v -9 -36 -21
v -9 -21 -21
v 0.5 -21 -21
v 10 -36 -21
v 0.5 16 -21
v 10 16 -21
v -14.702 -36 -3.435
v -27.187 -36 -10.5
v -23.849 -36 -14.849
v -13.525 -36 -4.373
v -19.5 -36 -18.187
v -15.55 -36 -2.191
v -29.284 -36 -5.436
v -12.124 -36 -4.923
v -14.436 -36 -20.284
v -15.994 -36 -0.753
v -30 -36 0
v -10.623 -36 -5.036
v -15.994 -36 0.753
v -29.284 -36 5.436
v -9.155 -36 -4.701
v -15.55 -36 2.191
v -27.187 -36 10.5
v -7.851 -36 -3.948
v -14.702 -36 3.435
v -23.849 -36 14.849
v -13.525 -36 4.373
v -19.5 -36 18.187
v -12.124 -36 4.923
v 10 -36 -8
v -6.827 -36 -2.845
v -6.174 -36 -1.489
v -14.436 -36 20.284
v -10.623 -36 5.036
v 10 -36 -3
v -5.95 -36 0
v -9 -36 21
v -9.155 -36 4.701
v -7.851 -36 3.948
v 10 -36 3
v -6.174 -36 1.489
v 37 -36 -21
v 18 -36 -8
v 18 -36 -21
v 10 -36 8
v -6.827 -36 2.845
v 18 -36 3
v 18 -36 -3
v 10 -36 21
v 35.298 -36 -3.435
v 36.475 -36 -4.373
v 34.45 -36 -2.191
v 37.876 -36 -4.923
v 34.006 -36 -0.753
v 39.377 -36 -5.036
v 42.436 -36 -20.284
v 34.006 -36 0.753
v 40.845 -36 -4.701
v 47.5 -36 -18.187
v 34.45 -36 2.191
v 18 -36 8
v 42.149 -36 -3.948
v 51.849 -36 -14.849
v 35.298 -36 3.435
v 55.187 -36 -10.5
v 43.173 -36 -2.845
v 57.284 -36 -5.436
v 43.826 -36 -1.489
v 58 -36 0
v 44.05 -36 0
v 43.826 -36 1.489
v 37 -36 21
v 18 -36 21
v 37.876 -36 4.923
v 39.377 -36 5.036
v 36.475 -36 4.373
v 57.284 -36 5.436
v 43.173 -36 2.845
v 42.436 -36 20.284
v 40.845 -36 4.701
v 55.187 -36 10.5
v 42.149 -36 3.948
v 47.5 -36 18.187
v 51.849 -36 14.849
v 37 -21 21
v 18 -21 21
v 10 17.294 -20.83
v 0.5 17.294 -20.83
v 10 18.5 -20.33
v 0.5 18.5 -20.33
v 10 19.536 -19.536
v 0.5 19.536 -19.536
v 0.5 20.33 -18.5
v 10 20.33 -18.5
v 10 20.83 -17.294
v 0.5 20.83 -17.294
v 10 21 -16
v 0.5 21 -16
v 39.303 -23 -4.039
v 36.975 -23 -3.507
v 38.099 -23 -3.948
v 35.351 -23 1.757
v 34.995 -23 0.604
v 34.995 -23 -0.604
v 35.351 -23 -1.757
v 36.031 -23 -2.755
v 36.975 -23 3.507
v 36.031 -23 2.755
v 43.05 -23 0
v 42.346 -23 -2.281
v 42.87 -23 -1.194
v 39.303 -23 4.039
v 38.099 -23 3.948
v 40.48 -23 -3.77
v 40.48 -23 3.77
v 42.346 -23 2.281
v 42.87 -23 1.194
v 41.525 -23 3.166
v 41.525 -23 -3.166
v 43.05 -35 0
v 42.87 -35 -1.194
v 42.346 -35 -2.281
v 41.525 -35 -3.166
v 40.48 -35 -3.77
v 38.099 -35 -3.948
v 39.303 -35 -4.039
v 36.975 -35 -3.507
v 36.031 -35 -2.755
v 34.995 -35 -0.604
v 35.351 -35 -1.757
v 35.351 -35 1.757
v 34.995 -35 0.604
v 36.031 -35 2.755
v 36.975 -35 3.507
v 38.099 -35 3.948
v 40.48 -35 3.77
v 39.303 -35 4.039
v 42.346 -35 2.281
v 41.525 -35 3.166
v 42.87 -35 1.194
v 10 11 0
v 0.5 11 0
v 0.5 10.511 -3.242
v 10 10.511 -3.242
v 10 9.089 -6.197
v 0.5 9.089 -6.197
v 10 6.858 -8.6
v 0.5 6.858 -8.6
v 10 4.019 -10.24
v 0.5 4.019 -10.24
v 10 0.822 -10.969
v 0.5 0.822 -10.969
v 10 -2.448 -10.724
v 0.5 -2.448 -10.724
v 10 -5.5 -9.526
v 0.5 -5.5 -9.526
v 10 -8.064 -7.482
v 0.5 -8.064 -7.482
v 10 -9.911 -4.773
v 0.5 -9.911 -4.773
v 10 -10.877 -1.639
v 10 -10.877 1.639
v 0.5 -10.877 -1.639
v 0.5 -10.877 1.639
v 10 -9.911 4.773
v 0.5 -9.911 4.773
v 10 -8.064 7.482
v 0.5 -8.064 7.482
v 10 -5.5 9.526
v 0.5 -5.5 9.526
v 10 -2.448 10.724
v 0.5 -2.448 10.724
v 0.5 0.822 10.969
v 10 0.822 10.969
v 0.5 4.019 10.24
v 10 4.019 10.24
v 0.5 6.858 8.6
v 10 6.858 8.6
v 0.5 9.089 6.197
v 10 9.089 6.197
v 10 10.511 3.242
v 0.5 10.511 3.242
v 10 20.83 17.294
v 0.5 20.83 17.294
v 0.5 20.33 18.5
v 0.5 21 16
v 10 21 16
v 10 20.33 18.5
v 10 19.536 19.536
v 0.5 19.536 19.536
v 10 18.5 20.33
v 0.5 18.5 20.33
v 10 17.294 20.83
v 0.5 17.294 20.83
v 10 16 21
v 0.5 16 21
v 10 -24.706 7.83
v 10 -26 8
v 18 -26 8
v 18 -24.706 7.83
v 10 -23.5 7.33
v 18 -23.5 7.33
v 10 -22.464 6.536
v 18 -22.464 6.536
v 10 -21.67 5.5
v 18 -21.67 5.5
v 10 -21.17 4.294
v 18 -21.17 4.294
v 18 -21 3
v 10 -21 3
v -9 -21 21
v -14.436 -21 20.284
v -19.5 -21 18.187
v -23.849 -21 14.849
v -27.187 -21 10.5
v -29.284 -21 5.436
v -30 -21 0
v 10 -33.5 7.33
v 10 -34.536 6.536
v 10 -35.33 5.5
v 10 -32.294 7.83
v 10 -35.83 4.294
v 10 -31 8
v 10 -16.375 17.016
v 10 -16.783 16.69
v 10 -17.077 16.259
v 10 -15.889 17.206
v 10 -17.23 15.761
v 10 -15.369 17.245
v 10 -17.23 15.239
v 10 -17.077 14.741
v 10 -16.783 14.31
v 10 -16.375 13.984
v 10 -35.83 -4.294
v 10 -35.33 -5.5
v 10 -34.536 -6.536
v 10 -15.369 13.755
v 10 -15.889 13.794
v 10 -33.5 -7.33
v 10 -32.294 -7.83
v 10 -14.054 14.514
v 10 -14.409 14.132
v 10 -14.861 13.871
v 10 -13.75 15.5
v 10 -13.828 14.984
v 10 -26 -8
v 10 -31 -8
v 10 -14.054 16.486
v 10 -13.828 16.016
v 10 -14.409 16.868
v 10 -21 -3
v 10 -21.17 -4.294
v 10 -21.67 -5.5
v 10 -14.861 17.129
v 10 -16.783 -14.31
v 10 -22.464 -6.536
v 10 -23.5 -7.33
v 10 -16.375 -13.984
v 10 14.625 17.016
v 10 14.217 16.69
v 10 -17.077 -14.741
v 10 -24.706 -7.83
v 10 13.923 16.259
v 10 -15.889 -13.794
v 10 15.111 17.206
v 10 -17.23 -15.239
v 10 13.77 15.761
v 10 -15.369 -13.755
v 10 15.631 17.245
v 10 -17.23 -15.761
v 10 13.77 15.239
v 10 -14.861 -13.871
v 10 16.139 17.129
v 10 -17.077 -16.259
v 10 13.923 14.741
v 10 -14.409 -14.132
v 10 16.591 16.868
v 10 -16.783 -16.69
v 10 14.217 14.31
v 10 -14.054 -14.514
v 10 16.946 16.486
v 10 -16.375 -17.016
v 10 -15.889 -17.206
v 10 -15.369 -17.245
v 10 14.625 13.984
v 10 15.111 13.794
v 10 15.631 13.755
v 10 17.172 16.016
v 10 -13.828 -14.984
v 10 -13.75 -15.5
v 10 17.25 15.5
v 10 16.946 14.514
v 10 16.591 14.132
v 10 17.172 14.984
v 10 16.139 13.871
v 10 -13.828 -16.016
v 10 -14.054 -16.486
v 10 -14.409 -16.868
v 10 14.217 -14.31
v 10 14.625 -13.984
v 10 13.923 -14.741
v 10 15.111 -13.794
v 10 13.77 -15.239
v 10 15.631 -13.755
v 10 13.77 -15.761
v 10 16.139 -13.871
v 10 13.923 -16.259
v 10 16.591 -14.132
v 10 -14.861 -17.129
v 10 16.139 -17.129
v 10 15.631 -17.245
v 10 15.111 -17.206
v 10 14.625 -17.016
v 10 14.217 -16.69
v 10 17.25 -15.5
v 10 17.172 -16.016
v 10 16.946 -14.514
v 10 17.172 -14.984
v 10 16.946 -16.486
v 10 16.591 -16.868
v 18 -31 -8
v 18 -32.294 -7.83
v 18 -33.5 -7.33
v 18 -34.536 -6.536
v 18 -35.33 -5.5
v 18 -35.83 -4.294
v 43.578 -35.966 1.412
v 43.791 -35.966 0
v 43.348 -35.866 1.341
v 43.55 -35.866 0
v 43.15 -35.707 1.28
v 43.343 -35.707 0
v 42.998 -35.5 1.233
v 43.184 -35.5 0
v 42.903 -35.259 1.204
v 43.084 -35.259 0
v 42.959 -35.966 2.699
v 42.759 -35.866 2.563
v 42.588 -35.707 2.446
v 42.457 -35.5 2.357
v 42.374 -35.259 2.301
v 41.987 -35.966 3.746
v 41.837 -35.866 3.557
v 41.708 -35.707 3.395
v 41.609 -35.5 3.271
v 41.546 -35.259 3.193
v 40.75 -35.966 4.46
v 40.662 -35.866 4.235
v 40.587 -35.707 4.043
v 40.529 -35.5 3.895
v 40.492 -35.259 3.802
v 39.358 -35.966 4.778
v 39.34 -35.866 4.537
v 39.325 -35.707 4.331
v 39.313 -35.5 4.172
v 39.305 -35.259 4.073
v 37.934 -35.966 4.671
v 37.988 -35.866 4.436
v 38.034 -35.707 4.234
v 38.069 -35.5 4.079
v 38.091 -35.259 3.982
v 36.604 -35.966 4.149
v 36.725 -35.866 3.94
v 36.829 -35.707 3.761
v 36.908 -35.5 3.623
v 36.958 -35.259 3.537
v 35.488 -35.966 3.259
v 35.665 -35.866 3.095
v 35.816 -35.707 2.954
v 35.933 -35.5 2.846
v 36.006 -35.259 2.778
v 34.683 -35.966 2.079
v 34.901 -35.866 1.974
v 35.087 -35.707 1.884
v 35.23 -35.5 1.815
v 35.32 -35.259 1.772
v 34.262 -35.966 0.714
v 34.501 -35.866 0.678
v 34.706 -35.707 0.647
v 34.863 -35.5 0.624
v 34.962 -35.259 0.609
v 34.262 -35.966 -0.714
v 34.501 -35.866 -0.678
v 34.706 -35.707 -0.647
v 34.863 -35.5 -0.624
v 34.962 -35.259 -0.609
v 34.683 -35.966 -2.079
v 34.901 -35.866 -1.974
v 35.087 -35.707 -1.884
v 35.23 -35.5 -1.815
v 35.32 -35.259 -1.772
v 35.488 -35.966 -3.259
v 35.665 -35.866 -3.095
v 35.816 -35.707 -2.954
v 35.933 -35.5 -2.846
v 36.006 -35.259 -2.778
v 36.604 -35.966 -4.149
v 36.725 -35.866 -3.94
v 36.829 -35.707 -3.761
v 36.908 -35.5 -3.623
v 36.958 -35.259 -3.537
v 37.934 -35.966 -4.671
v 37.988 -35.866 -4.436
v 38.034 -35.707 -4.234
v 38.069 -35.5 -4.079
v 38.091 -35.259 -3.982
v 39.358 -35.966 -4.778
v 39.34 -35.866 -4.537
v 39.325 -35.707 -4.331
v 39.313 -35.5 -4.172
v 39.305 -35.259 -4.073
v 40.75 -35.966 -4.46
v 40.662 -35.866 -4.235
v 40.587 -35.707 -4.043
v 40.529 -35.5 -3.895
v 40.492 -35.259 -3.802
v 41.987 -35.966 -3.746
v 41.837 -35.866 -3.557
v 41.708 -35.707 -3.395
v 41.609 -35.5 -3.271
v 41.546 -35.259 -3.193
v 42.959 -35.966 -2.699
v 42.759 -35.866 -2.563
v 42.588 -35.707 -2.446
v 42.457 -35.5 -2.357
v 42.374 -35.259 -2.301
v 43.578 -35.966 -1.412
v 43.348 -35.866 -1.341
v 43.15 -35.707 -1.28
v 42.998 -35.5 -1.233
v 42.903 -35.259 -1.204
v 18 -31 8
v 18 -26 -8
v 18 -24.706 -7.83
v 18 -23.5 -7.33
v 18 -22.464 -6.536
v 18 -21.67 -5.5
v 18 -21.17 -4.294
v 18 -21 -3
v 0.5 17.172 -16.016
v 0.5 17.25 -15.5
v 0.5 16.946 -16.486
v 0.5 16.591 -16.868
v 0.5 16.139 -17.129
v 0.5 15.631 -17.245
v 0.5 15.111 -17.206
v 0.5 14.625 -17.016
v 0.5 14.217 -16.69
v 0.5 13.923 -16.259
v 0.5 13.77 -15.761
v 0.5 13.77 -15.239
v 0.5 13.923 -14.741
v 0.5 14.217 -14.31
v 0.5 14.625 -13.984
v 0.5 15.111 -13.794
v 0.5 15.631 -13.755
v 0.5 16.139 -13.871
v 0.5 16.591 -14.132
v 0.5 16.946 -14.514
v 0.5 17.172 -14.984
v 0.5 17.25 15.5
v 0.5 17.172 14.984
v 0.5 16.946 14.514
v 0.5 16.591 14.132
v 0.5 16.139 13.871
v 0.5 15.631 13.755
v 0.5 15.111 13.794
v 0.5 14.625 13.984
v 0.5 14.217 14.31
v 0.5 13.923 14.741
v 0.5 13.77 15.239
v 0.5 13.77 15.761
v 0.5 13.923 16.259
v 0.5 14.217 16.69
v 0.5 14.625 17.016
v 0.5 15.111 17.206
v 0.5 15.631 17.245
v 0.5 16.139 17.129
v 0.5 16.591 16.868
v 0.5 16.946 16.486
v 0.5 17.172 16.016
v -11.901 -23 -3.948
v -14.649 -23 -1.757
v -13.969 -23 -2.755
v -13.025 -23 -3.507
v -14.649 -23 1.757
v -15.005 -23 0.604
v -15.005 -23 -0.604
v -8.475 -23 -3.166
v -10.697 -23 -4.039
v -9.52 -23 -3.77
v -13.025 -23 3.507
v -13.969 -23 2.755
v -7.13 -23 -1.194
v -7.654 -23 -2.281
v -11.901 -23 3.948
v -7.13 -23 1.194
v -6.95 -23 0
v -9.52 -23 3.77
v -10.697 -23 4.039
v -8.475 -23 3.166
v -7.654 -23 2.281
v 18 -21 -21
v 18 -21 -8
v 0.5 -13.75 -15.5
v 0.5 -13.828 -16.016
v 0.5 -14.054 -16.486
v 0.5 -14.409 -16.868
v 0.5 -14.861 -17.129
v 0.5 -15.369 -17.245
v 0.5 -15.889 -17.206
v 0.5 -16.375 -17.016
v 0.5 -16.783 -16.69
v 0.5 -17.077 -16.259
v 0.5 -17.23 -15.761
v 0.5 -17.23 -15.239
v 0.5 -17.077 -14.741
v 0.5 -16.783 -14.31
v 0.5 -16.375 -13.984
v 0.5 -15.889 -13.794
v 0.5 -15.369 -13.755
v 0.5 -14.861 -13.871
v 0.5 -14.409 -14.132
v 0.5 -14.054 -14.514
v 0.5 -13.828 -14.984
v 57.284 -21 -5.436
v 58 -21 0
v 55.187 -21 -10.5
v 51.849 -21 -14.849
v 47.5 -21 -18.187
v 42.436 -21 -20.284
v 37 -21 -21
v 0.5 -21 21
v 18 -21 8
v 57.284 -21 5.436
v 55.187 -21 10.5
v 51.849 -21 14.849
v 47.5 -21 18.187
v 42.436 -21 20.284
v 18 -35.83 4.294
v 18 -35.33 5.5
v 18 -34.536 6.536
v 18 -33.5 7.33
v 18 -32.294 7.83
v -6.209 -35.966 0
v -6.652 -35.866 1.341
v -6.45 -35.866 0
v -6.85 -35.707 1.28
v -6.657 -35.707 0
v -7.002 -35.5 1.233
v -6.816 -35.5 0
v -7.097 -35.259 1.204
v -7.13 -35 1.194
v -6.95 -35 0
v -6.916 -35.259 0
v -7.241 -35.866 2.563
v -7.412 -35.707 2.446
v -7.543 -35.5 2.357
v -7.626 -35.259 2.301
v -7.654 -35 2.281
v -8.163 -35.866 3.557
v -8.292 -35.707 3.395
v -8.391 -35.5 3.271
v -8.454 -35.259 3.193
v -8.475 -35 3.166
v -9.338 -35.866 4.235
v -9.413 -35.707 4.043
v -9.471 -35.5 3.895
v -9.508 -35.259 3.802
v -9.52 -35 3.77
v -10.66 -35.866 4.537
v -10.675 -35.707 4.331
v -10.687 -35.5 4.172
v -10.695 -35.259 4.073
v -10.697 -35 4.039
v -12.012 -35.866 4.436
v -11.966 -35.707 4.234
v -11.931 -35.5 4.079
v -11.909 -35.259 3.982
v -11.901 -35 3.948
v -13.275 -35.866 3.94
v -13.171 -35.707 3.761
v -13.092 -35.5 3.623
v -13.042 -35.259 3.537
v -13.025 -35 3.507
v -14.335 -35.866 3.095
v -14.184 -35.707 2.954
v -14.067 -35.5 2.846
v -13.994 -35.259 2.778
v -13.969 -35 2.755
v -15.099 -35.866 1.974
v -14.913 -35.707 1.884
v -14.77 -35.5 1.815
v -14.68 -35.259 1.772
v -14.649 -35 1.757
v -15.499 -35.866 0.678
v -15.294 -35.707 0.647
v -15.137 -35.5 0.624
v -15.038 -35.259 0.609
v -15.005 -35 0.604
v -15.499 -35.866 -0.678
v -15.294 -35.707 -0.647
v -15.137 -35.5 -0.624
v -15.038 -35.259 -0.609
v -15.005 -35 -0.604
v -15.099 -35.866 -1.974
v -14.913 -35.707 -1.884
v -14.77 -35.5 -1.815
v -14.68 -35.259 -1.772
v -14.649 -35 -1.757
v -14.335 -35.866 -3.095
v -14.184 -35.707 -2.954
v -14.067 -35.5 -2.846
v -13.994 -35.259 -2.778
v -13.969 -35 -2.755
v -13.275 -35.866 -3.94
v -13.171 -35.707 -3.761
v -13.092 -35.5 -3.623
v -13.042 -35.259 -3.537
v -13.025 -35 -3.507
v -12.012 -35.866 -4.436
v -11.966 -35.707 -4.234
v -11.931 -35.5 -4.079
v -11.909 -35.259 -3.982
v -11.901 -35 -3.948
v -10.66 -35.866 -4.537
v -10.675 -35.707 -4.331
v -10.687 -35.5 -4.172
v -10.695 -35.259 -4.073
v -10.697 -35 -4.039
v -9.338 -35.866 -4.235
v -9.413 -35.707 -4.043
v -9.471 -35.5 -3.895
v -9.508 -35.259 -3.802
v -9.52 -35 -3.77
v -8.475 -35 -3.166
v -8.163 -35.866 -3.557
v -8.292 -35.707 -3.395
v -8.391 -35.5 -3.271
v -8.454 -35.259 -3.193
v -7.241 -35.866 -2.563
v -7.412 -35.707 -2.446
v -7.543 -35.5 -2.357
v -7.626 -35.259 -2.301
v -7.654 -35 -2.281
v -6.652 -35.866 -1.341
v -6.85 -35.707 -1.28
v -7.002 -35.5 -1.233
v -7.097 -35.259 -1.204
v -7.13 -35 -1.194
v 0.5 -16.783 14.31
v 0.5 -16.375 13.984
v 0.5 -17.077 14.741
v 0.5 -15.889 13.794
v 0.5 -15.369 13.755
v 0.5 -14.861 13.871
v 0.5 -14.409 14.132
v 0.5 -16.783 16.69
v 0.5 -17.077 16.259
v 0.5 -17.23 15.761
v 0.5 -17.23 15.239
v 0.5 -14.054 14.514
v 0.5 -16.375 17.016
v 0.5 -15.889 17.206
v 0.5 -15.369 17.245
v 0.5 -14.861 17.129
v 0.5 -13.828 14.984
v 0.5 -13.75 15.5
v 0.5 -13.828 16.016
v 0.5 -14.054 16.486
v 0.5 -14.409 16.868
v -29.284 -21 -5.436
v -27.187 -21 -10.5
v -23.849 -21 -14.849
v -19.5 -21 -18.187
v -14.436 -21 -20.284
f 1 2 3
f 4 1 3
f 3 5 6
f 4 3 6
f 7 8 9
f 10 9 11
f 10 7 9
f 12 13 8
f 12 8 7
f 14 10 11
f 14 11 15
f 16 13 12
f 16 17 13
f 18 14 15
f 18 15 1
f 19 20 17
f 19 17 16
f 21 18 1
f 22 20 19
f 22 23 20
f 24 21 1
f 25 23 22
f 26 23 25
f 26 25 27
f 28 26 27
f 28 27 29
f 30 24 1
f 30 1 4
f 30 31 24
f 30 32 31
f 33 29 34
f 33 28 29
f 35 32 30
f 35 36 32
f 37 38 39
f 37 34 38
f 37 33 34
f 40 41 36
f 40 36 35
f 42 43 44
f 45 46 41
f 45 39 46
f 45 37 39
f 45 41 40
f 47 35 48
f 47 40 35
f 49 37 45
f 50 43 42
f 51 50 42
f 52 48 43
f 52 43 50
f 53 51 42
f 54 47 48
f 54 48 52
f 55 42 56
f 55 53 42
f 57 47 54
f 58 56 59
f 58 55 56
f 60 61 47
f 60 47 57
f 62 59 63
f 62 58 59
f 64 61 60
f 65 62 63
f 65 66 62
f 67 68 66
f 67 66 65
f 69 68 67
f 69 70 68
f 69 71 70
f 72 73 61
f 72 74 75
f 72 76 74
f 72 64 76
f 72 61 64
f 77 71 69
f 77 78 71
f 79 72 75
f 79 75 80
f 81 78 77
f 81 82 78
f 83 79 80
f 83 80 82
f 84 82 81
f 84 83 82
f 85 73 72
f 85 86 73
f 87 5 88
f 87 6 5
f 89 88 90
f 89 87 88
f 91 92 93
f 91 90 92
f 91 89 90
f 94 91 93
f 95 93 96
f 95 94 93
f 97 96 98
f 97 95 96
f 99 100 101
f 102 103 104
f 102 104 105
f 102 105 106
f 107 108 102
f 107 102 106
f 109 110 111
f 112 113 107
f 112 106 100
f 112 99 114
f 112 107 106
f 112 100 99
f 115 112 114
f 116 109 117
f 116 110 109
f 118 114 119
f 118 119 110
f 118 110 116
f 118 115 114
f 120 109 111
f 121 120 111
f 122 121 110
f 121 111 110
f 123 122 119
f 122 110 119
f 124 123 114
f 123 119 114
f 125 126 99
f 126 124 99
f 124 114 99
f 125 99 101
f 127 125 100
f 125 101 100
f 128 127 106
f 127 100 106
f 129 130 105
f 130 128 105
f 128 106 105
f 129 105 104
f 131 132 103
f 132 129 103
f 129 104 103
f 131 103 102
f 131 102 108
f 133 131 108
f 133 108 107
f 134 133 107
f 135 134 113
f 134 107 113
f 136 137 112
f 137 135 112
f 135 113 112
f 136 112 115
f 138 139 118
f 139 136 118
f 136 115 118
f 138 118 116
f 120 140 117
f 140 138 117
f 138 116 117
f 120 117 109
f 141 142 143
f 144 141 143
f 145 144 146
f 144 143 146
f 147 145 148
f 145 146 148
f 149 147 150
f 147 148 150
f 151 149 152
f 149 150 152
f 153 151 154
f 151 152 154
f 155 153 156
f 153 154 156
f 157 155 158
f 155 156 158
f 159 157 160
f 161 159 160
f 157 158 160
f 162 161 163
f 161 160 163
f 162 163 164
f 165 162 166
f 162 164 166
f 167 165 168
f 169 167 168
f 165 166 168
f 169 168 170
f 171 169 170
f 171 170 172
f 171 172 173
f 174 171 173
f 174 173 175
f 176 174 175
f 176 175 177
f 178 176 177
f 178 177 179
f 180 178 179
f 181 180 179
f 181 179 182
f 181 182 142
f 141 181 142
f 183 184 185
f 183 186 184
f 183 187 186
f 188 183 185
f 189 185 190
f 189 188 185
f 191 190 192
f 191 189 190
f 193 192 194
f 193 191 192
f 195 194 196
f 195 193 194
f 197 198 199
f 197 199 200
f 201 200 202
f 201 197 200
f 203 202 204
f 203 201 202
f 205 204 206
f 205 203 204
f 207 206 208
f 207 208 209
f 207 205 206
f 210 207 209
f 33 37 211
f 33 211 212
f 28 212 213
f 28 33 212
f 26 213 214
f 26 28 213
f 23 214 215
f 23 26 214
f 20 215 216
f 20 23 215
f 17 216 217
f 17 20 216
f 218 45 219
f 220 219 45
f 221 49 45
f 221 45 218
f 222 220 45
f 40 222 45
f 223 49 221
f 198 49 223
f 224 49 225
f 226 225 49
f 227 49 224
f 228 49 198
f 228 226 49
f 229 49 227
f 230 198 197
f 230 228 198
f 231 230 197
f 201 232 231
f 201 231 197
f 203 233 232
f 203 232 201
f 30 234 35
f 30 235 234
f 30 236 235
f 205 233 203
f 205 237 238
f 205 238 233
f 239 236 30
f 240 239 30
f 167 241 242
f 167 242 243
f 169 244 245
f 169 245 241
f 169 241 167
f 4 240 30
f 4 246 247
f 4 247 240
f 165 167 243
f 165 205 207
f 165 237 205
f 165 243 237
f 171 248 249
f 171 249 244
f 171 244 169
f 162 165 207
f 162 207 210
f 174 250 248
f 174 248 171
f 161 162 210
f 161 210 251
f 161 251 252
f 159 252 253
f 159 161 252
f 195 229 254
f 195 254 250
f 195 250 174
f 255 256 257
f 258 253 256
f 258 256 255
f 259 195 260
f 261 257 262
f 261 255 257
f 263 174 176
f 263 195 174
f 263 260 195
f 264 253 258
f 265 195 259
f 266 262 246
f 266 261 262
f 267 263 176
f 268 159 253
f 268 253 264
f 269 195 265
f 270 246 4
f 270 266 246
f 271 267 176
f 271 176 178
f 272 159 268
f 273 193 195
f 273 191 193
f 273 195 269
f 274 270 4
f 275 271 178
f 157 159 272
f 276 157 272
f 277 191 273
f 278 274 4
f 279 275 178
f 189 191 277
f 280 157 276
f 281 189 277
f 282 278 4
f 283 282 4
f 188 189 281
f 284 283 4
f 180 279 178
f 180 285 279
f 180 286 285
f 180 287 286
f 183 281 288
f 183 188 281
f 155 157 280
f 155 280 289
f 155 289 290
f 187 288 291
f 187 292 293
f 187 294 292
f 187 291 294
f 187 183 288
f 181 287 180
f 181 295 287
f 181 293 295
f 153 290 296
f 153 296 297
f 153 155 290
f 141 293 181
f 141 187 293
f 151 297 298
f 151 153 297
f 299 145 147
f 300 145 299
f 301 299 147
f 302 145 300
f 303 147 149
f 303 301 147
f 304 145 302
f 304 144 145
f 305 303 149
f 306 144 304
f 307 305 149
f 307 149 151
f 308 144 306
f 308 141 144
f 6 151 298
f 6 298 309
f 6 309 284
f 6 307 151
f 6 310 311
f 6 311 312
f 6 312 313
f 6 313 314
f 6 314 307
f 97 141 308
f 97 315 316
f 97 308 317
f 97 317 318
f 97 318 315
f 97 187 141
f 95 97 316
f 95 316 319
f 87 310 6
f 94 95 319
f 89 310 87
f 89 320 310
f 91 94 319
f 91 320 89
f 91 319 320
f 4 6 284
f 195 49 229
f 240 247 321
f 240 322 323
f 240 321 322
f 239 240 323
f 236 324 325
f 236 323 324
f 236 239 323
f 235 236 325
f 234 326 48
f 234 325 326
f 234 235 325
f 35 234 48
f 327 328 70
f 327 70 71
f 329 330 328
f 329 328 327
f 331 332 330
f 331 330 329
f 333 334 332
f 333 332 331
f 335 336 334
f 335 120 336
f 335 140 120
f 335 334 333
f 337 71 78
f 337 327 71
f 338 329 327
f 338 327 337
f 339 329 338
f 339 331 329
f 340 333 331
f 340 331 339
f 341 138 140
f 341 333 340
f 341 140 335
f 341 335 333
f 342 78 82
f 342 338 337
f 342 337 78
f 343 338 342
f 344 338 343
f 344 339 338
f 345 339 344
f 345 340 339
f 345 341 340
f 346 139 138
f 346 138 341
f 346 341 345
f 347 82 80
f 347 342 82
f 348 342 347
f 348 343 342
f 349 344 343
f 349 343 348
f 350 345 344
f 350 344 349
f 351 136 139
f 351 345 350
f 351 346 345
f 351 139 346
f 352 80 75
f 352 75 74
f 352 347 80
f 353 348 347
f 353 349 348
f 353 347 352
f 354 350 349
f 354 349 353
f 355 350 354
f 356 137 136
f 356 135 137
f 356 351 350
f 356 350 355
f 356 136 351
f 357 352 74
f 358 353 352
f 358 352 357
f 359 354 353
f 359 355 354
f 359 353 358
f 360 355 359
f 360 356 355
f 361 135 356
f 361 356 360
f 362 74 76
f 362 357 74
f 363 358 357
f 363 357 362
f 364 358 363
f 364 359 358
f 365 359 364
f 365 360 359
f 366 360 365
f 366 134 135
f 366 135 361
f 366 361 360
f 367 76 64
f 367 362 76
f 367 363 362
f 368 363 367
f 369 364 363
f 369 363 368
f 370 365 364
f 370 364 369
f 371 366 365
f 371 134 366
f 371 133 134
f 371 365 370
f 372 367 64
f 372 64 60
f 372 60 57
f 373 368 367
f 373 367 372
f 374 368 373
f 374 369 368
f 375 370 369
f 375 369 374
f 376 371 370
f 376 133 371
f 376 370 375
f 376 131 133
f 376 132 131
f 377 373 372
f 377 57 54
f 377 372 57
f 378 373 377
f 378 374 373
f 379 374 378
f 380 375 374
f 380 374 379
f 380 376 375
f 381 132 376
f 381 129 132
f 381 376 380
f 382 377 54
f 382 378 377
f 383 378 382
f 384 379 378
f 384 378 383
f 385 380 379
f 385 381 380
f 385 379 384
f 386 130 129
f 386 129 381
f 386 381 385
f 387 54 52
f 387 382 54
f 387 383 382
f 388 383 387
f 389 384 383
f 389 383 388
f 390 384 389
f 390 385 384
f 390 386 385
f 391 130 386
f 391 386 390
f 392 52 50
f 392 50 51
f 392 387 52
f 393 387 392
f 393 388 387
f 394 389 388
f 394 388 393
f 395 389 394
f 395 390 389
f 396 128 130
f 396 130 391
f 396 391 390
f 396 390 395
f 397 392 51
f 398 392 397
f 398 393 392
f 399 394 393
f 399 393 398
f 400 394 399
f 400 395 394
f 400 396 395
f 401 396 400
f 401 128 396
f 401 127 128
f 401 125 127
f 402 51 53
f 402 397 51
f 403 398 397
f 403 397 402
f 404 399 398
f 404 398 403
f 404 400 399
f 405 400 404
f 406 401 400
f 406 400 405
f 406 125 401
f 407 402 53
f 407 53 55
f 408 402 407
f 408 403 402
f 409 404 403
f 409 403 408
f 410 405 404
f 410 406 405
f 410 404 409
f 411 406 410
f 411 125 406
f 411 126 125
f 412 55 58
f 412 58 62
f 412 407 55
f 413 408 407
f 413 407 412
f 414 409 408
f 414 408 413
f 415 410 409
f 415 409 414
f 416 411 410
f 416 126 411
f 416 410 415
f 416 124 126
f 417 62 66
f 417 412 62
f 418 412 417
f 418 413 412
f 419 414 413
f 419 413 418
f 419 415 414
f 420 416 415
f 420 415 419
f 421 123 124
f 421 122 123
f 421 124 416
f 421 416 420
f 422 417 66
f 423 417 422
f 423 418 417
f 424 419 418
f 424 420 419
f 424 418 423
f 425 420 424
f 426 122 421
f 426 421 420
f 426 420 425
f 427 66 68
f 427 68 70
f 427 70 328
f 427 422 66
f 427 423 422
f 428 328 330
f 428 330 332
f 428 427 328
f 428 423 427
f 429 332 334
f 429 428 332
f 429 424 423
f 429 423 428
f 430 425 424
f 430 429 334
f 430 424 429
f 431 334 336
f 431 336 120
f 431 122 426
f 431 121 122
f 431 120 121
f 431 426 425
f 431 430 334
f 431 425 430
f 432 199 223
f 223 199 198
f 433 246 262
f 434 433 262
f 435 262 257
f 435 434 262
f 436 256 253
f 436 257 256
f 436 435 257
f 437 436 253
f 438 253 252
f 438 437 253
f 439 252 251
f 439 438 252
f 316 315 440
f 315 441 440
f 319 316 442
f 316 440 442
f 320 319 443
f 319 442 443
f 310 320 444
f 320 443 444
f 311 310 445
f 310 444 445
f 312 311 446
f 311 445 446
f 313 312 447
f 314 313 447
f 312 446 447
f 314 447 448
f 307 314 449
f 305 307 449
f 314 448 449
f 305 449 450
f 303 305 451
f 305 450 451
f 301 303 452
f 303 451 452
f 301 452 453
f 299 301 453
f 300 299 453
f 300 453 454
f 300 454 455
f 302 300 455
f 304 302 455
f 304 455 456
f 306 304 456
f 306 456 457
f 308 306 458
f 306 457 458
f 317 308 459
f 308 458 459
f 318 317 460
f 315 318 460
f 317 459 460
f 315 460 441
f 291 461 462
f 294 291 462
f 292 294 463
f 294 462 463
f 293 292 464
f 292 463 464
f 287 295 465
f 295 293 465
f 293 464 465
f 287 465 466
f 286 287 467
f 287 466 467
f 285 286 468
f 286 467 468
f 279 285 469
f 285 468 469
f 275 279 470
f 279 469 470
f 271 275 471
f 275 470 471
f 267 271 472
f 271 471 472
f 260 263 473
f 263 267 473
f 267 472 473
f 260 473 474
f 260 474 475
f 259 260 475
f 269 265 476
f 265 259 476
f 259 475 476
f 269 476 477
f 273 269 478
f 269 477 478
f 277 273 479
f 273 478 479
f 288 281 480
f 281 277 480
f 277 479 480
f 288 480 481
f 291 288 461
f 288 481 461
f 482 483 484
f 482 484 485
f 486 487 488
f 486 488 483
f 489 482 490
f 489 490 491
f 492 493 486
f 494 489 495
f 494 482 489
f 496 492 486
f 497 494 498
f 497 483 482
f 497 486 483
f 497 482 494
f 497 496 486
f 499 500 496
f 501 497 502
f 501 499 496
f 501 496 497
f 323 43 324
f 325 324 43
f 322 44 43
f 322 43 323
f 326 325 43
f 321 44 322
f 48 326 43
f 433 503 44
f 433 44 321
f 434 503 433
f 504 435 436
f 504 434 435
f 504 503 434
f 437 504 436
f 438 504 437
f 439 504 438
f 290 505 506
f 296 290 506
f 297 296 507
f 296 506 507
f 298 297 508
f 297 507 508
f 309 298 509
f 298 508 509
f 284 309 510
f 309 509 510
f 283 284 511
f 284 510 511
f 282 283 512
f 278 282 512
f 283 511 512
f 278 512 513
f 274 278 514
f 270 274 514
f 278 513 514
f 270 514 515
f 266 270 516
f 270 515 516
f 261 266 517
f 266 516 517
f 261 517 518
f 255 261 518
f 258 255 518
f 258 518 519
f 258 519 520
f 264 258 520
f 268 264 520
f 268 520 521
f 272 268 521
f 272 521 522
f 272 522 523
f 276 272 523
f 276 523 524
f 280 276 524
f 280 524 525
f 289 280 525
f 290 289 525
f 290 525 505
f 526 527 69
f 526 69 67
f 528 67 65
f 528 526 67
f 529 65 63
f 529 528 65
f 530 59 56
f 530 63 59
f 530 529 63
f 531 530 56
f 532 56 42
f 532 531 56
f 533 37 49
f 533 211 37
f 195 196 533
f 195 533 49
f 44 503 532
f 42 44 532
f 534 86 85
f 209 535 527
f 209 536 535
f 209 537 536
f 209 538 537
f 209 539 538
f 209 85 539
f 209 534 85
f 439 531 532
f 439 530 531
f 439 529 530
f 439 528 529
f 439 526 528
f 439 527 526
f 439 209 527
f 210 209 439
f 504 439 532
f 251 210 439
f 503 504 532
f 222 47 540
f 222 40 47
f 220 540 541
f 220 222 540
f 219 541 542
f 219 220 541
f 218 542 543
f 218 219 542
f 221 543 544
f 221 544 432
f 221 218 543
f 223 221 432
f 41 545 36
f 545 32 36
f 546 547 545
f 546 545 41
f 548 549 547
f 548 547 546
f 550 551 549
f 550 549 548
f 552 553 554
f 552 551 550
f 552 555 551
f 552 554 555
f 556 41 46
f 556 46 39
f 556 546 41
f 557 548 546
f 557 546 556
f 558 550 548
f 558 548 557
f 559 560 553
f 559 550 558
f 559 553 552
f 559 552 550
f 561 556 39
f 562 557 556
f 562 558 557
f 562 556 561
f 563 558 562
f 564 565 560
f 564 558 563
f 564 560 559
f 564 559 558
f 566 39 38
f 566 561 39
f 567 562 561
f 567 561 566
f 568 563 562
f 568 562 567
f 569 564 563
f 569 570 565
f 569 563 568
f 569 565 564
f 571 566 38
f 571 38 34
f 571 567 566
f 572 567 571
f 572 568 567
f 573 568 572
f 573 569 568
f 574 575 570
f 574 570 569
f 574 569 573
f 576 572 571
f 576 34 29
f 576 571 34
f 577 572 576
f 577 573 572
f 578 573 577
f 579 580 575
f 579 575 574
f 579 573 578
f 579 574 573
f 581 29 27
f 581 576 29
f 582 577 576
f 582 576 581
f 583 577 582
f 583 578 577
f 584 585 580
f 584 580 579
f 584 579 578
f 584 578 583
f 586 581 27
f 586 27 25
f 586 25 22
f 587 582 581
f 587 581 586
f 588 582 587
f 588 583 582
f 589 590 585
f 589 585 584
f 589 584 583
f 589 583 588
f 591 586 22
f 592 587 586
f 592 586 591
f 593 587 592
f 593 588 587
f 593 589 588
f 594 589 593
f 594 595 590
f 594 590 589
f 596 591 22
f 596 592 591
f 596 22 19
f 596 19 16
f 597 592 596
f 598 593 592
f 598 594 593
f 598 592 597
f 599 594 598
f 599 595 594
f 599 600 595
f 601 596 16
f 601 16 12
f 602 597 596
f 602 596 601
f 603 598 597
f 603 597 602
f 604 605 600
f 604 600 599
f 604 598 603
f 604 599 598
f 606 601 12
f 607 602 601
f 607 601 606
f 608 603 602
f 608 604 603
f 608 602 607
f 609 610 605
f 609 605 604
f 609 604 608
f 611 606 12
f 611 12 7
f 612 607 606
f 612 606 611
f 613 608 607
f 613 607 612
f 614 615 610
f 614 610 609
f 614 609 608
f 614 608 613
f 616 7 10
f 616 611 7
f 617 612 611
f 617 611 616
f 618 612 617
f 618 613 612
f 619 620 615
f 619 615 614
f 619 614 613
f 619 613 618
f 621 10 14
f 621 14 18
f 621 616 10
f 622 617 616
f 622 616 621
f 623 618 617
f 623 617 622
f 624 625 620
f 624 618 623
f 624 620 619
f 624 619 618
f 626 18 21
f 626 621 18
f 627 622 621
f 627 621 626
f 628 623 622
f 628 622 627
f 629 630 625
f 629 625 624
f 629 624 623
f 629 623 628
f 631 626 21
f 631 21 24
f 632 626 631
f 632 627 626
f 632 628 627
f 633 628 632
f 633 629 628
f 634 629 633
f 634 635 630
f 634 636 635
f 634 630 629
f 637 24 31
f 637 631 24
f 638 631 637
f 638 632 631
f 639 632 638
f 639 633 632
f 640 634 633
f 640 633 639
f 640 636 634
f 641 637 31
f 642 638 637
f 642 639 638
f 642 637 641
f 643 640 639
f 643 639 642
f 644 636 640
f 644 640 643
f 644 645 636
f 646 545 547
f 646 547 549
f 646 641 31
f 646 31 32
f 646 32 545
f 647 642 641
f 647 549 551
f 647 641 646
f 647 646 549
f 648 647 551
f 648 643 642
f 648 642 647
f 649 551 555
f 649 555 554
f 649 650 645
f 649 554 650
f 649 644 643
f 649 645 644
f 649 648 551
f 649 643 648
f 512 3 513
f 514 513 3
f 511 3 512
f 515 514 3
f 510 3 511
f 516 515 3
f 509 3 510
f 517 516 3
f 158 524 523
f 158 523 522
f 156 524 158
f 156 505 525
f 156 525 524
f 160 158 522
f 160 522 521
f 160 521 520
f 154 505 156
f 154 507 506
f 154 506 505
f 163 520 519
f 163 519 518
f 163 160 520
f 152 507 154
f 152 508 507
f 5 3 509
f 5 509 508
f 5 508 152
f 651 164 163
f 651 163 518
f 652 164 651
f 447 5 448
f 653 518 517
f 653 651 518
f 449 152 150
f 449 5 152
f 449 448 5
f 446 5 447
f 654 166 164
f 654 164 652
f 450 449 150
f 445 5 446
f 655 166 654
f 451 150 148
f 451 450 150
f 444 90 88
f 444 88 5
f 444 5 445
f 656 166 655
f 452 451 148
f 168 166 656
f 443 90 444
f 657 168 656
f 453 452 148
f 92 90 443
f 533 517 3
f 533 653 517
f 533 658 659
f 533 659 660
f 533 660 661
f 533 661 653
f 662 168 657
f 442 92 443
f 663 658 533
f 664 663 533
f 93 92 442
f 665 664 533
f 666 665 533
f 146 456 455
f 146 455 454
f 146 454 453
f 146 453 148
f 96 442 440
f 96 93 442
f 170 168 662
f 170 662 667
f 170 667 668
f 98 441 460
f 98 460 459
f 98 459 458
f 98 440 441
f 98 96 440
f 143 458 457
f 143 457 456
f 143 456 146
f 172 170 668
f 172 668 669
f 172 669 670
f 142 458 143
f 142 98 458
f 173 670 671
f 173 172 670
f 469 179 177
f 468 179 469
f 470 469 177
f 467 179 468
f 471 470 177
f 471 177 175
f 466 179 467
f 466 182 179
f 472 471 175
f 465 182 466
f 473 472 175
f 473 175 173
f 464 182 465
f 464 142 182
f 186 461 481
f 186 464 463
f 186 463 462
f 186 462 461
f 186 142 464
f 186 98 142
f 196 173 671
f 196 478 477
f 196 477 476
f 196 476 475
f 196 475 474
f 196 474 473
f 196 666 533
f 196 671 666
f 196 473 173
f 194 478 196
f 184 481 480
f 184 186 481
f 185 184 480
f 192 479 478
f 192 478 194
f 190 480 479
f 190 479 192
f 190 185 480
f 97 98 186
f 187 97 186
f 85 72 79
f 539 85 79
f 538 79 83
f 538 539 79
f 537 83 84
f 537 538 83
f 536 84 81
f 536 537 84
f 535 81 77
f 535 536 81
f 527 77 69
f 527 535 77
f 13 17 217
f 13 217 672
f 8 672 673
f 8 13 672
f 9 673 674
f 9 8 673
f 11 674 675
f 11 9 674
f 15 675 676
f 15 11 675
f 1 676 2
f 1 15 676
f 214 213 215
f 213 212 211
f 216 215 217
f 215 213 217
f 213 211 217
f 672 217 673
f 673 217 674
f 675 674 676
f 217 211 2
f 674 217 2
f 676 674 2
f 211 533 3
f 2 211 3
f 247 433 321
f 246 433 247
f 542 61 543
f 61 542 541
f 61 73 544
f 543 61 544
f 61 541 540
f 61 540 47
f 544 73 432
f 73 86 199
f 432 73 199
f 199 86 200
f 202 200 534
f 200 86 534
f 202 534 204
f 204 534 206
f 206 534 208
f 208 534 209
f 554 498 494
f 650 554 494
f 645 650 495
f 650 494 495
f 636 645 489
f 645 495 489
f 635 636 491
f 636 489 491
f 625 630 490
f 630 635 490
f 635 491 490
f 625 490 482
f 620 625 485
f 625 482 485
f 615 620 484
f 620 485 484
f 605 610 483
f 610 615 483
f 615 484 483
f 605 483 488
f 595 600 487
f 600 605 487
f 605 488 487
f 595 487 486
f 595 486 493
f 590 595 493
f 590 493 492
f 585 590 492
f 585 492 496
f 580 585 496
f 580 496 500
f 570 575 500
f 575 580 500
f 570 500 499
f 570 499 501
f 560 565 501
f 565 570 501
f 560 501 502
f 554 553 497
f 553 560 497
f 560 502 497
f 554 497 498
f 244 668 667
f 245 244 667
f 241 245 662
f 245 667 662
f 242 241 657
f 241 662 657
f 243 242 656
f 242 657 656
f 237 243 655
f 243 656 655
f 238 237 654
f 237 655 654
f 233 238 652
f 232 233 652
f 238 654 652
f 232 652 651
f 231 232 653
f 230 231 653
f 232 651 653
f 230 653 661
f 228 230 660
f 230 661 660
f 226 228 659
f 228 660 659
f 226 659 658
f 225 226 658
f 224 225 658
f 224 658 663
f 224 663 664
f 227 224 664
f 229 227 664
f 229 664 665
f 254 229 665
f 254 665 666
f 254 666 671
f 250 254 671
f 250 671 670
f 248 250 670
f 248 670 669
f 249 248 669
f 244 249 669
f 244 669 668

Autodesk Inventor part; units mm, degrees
ref_plane "YZ Plane" through (0, 0, 0) normal (1, 0, 0) x (0, 1, 0)
ref_plane "XZ Plane" through (0, 0, 0) normal (0, 1, 0) x (-1, 0, 0)
ref_plane "XY Plane" through (0, 0, 0) normal (0, 0, 1) x (1, 0, 0)
sketch "Esquisse1" plane through (0, 0, 0) normal (1, 0, 0) x (0, 1, 0)
  line L0 (21, 21) -> (-21, 21)
  line L1 (-21, 21) -> (-21, -21)
  line L2 (-21, -21) -> (21, -21)
  line L3 (21, -21) -> (21, 21)
  line L4 (21, 21) -> (-21, -21)
  line L5 (-21, 21) -> (21, -21)
  circle A0 centre (0, 0) radius 11
  line L6 (15.5, 15.5) -> (-15.5, 15.5)
  line L7 (-15.5, 15.5) -> (-15.5, -15.5)
  line L8 (-15.5, -15.5) -> (15.5, -15.5)
  line L9 (15.5, -15.5) -> (15.5, 15.5)
  line L10 (15.5, 15.5) -> (-15.5, -15.5)
  line L11 (-15.5, 15.5) -> (15.5, -15.5)
  circle A1 centre (15.5, 15.5) radius 1.75
  circle A2 centre (-15.5, 15.5) radius 1.75
  line L12 (21, 0) -> (-21, 0)
  circle A3 centre (15.5, -15.5) radius 1.75
  circle A4 centre (-15.5, -15.5) radius 1.75
  point P0 (0, 0)
  point P1 (0, 0)
  dimension "d0" = 42
  dimension "d1" = 22
  dimension "d2" = 31
  dimension "d3" = 3.5
  dimension "d4" = 3.5
extrude "Extrusion1" add sketch "Esquisse1" along normal blind 10 contours L4 A1 L6 A2 L5 L0 | L3 L12 L9 A1 L4 | L5 A2 L7 L12 L1 | L3 L5 A3 L9 L12 | L12 L7 A4 L4 L1 | L2 L4 A4 L8 A3 L5 | L12 A0 L4 A1 L9 | L9 A3 L5 A0 L12 | A1 L4 A0 L5 A2 L6 | L12 A0 L4 A4 L7 | L7 A2 L5 A0 L12 | L8 A4 L4 A0 L5 A3
sketch "Esquisse2" plane through (0, -21, -21) normal (0, -1, 0) x (1, 0, 0)
  point P0 (0, 21)
sketch "Esquisse3" plane through (0, -21, -21) normal (0, -1, 0) x (1, 0, 0)
  line L0 (0, 42) -> (0, 0) projected
  line L1 (0, 42) -> (12, 42)
  line L2 (12, 42) -> (12, 0)
  line L3 (12, 0) -> (0, 0)
  line L4 (0, 0) -> (0, 42)
  point P0 (0, 21)
  dimension "d19" = 12
extrude "Extrusion2" add sketch "Esquisse3" along normal blind 10
sketch "Esquisse4" plane through (10, 0, 0) normal (1, 0, 0) x (0, 0, -1)
  line L0 (21, -31) -> (-21, -31) projected
  line L1 (21, 21) -> (21, -31) projected
  line L2 (-21, -31) -> (21, -31)
  line L3 (21, -31) -> (21, -21)
  line L4 (21, -21) -> (-21, -21)
  line L5 (-21, -21) -> (-21, -31)
  point P0 (0, 0)
extrude "Extrusion3" add sketch "Esquisse4" along normal blind 8
sketch "Esquisse5" plane through (18, 0, 0) normal (1, 0, 0) x (0, 0, -1)
  line L0 (-21, -21) -> (-21, -31) projected
  line L1 (-21, -31) -> (21, -31) projected
  line L2 (-21, -21) -> (21, -21)
  line L3 (21, -21) -> (21, -31)
  line L4 (21, -31) -> (-21, -31)
  line L5 (-21, -31) -> (-21, -21)
  point P0 (0, 0)
extrude "Extrusion4" add sketch "Esquisse5" along normal blind 40
sketch "Esquisse9" plane through (10, -21, 21) normal (0, 1, 0) x (1, 0, 0)
  line L0 (0, 0) -> (0, 42) projected
  line L1 (0, 0) -> (48, 0) projected
  line L2 (0, 42) -> (8, 42)
  line L3 (8, 42) -> (8, 0)
  line L4 (8, 0) -> (0, 0)
  line L5 (0, 0) -> (0, 42)
  line L6 (0, 21) -> (8, 21)
  line L7 (0, 29) -> (8, 29)
  line L8 (8, 29) -> (8, 13)
  line L9 (8, 13) -> (0, 13)
  line L10 (0, 13) -> (0, 29)
  point P0 (-10, 21)
  point P1 (0, 13)
  point P2 (8, 29)
  dimension "d24" = 16
extrude "Extrusion7" cut sketch "Esquisse9" against normal blind 10 contours L0 L9 L3 L1 | L0 L2 L3 L7
sketch "Esquisse10" plane through (0, 0, 0) normal (-1, 0, 0) x (0, 0, 1)
  line L0 (21, 21) -> (21, -31) projected
  line L1 (-21, -31) -> (21, -31)
  line L2 (21, -31) -> (21, -21)
  line L3 (21, -21) -> (-21, -21)
  line L4 (-21, -21) -> (-21, -31)
  point P0 (0, 0)
  point P1 (21, -31)
extrude "Extrusion8" add sketch "Esquisse10" along normal blind 30
sketch "Esquisse11" plane through (0, -31, -21) normal (0, -1, 0) x (1, 0, 0)
  line L0 (18, 42) -> (58, 42) projected
  line L1 (18, 0) -> (58, 0) projected
  line L2 (0, 42) -> (-30, 42) projected
  line L3 (10, 29) -> (18, 29) projected
  line L4 (14, 29) -> (14, 13)
  line L5 (18, 13) -> (10, 13) projected
  circle A0 centre (-11, 21) radius 4.05
  circle A1 centre (39, 21) radius 4.05
  point P0 (0, 21)
  point P1 (0, 0)
  point P2 (33, 21)
  point P3 (0, 21)
  point P4 (14, 21)
  dimension "d32" = 8.1
  dimension "d33" = 25
extrude "Extrusion9" cut sketch "Esquisse11" against normal blind 8
sketch "Esquisse12" plane through (0, -31, -21) normal (0, -1, 0) x (1, 0, 0)
  line L0 (0, 42) -> (-30, 42) projected
  line L1 (-30, 42) -> (10, 42)
  line L2 (10, 42) -> (10, 29)
  line L3 (18, 29) -> (10, 29) projected
  line L4 (18, 42) -> (18, 29) projected
  line L5 (18, 29) -> (18, 42)
  line L6 (18, 42) -> (48, 42)
  line L7 (48, 0) -> (18, 0)
  line L8 (18, 0) -> (18, 13)
  line L9 (18, 13) -> (10, 13)
  line L10 (10, 13) -> (10, 0)
  line L11 (-30, 0) -> (-30, 42)
  line L12 (10, 29) -> (18, 29)
  line L13 (10, 13) -> (18, 13)
  line L14 (0, 0) -> (10, 0) projected
  line L15 (0, 0) -> (10.2767, 0)
  line L16 (0, 0) -> (10, 0)
  line L17 (0, 0) -> (-30, 0) projected
  line L18 (-30, 0) -> (0, 0)
  circle A0 centre (-11, 21) radius 4.05
  circle A1 centre (39, 21) radius 4.05
  line L19 (18, 42) -> (58, 42) projected
  line L20 (48, 42) -> (58, 42)
  line L21 (58, 42) -> (58, 0)
  line L22 (18, 0) -> (58, 0) projected
  line L23 (48, 0) -> (58, 0)
  point P0 (0, 21)
extrude "Extrusion10" add sketch "Esquisse12" along normal blind 5
sketch "Esquisse13" plane through (0, 0, 0) normal (-1, 0, 0) x (0, 0, 1)
  circle A0 centre (-15.5, 15.5) radius 1.75 projected
  circle A1 centre (-15.5, 15.5) radius 1.75
  circle A2 centre (15.5, 15.5) radius 1.75 projected
  circle A3 centre (15.5, 15.5) radius 1.75
  circle A4 centre (15.5, -15.5) radius 1.75 projected
  circle A5 centre (15.5, -15.5) radius 1.75
  circle A6 centre (-15.5, -15.5) radius 1.75 projected
  circle A7 centre (-15.5, -15.5) radius 1.75
  line L0 (-21, -21) -> (21, -21) projected
  line L1 (-21, 21) -> (21, 21)
  line L2 (21, 21) -> (21, -21)
  line L3 (21, -21) -> (-21, -21)
  line L4 (-21, -21) -> (-21, 21)
  circle A8 centre (0, 0) radius 11
extrude "Extrusion11" cut sketch "Esquisse13" against normal blind 0.5
fillet "Congé5" radius 21 4 edges at (-30, -28.5, 21) (-30, -28.5, -21) (58, -28.5, -21) (58, -28.5, 21)
fillet "Congé6" radius 5 2 edges at (5.25, 21, -21) (5.25, 21, 21)
fillet "Congé7" radius 5 4 edges at (14, -21, -8) (14, -21, 8) (14, -36, 8) (14, -36, -8)
fillet "Congé8" radius 1 2 edges at (34.95, -36, 0) (-15.05, -36, 0)
properties part number "tete_Impression 3D"
